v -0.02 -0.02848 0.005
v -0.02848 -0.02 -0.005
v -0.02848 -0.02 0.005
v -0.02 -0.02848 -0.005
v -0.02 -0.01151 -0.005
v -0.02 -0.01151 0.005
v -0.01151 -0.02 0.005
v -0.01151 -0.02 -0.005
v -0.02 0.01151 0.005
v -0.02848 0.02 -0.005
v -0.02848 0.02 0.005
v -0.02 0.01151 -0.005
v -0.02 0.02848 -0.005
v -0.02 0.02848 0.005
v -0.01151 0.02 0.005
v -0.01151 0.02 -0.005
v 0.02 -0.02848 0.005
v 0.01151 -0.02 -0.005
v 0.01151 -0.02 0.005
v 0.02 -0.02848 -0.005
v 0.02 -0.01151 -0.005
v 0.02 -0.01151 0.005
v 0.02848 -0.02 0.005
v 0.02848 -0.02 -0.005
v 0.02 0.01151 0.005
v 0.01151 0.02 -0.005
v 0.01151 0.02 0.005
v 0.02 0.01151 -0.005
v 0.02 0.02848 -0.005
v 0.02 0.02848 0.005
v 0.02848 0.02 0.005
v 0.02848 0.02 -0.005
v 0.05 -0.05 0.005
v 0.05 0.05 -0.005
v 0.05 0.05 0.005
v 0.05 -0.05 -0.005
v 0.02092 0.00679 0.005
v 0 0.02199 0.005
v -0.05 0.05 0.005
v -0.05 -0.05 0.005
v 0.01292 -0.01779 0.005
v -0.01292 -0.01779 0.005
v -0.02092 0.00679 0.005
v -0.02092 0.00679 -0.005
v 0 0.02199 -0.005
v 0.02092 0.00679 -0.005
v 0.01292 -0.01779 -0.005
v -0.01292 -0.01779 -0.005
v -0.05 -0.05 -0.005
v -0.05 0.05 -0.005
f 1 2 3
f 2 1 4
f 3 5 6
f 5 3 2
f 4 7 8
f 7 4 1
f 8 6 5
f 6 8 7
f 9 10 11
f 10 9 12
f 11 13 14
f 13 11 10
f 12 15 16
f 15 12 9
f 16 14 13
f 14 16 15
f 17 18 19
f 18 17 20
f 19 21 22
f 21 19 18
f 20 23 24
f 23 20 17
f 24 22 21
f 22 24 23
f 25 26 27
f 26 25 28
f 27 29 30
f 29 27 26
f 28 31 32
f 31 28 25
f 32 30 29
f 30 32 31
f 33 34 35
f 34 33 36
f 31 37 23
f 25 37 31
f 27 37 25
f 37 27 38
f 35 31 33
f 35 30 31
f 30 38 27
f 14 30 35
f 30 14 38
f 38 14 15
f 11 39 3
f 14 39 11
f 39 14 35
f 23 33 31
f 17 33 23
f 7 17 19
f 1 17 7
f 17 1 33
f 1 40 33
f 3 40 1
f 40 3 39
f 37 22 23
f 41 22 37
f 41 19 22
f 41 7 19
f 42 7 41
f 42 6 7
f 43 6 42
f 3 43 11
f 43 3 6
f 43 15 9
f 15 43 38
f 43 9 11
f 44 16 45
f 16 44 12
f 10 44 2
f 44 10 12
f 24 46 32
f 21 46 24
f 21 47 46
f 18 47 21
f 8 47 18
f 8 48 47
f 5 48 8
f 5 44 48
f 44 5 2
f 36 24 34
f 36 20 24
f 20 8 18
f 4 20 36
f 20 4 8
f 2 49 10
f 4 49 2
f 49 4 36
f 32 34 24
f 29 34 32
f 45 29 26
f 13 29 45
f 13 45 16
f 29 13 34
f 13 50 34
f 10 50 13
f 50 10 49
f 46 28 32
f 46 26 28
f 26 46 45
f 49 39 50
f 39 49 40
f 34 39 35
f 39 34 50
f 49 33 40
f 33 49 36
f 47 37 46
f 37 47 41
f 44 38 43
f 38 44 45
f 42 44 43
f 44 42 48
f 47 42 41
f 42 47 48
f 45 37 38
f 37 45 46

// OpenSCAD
$fn=64;

plate_x = 0.1;
plate_y = 0.1;
plate_t = 0.01;

corner_offset = 0.03;
diamond_hole_d = 0.012;

pent_r = 0.022;

module base_plate() {
    translate([0,0,0]) cube([plate_x, plate_y, plate_t], center=true);
}

module pentagon_cutout(h) {
    linear_extrude(height=h, center=true, convexity=10)
        polygon(points=[for(i=[0:4]) [pent_r*cos(90+i*72), pent_r*sin(90+i*72)]]);
}

module diamond_hole(h, d) {
    rotate([0,0,45]) translate([0,0,0]) cube([d,d,h], center=true);
}

module corner_holes(h) {
    for (sx=[-1,1], sy=[-1,1])
        translate([sx*(plate_x/2 - corner_offset), sy*(plate_y/2 - corner_offset), 0])
            diamond_hole(h, diamond_hole_d);
}

difference() {
    base_plate();
    pentagon_cutout(plate_t + 0.2);
    corner_holes(plate_t + 0.2);
}
